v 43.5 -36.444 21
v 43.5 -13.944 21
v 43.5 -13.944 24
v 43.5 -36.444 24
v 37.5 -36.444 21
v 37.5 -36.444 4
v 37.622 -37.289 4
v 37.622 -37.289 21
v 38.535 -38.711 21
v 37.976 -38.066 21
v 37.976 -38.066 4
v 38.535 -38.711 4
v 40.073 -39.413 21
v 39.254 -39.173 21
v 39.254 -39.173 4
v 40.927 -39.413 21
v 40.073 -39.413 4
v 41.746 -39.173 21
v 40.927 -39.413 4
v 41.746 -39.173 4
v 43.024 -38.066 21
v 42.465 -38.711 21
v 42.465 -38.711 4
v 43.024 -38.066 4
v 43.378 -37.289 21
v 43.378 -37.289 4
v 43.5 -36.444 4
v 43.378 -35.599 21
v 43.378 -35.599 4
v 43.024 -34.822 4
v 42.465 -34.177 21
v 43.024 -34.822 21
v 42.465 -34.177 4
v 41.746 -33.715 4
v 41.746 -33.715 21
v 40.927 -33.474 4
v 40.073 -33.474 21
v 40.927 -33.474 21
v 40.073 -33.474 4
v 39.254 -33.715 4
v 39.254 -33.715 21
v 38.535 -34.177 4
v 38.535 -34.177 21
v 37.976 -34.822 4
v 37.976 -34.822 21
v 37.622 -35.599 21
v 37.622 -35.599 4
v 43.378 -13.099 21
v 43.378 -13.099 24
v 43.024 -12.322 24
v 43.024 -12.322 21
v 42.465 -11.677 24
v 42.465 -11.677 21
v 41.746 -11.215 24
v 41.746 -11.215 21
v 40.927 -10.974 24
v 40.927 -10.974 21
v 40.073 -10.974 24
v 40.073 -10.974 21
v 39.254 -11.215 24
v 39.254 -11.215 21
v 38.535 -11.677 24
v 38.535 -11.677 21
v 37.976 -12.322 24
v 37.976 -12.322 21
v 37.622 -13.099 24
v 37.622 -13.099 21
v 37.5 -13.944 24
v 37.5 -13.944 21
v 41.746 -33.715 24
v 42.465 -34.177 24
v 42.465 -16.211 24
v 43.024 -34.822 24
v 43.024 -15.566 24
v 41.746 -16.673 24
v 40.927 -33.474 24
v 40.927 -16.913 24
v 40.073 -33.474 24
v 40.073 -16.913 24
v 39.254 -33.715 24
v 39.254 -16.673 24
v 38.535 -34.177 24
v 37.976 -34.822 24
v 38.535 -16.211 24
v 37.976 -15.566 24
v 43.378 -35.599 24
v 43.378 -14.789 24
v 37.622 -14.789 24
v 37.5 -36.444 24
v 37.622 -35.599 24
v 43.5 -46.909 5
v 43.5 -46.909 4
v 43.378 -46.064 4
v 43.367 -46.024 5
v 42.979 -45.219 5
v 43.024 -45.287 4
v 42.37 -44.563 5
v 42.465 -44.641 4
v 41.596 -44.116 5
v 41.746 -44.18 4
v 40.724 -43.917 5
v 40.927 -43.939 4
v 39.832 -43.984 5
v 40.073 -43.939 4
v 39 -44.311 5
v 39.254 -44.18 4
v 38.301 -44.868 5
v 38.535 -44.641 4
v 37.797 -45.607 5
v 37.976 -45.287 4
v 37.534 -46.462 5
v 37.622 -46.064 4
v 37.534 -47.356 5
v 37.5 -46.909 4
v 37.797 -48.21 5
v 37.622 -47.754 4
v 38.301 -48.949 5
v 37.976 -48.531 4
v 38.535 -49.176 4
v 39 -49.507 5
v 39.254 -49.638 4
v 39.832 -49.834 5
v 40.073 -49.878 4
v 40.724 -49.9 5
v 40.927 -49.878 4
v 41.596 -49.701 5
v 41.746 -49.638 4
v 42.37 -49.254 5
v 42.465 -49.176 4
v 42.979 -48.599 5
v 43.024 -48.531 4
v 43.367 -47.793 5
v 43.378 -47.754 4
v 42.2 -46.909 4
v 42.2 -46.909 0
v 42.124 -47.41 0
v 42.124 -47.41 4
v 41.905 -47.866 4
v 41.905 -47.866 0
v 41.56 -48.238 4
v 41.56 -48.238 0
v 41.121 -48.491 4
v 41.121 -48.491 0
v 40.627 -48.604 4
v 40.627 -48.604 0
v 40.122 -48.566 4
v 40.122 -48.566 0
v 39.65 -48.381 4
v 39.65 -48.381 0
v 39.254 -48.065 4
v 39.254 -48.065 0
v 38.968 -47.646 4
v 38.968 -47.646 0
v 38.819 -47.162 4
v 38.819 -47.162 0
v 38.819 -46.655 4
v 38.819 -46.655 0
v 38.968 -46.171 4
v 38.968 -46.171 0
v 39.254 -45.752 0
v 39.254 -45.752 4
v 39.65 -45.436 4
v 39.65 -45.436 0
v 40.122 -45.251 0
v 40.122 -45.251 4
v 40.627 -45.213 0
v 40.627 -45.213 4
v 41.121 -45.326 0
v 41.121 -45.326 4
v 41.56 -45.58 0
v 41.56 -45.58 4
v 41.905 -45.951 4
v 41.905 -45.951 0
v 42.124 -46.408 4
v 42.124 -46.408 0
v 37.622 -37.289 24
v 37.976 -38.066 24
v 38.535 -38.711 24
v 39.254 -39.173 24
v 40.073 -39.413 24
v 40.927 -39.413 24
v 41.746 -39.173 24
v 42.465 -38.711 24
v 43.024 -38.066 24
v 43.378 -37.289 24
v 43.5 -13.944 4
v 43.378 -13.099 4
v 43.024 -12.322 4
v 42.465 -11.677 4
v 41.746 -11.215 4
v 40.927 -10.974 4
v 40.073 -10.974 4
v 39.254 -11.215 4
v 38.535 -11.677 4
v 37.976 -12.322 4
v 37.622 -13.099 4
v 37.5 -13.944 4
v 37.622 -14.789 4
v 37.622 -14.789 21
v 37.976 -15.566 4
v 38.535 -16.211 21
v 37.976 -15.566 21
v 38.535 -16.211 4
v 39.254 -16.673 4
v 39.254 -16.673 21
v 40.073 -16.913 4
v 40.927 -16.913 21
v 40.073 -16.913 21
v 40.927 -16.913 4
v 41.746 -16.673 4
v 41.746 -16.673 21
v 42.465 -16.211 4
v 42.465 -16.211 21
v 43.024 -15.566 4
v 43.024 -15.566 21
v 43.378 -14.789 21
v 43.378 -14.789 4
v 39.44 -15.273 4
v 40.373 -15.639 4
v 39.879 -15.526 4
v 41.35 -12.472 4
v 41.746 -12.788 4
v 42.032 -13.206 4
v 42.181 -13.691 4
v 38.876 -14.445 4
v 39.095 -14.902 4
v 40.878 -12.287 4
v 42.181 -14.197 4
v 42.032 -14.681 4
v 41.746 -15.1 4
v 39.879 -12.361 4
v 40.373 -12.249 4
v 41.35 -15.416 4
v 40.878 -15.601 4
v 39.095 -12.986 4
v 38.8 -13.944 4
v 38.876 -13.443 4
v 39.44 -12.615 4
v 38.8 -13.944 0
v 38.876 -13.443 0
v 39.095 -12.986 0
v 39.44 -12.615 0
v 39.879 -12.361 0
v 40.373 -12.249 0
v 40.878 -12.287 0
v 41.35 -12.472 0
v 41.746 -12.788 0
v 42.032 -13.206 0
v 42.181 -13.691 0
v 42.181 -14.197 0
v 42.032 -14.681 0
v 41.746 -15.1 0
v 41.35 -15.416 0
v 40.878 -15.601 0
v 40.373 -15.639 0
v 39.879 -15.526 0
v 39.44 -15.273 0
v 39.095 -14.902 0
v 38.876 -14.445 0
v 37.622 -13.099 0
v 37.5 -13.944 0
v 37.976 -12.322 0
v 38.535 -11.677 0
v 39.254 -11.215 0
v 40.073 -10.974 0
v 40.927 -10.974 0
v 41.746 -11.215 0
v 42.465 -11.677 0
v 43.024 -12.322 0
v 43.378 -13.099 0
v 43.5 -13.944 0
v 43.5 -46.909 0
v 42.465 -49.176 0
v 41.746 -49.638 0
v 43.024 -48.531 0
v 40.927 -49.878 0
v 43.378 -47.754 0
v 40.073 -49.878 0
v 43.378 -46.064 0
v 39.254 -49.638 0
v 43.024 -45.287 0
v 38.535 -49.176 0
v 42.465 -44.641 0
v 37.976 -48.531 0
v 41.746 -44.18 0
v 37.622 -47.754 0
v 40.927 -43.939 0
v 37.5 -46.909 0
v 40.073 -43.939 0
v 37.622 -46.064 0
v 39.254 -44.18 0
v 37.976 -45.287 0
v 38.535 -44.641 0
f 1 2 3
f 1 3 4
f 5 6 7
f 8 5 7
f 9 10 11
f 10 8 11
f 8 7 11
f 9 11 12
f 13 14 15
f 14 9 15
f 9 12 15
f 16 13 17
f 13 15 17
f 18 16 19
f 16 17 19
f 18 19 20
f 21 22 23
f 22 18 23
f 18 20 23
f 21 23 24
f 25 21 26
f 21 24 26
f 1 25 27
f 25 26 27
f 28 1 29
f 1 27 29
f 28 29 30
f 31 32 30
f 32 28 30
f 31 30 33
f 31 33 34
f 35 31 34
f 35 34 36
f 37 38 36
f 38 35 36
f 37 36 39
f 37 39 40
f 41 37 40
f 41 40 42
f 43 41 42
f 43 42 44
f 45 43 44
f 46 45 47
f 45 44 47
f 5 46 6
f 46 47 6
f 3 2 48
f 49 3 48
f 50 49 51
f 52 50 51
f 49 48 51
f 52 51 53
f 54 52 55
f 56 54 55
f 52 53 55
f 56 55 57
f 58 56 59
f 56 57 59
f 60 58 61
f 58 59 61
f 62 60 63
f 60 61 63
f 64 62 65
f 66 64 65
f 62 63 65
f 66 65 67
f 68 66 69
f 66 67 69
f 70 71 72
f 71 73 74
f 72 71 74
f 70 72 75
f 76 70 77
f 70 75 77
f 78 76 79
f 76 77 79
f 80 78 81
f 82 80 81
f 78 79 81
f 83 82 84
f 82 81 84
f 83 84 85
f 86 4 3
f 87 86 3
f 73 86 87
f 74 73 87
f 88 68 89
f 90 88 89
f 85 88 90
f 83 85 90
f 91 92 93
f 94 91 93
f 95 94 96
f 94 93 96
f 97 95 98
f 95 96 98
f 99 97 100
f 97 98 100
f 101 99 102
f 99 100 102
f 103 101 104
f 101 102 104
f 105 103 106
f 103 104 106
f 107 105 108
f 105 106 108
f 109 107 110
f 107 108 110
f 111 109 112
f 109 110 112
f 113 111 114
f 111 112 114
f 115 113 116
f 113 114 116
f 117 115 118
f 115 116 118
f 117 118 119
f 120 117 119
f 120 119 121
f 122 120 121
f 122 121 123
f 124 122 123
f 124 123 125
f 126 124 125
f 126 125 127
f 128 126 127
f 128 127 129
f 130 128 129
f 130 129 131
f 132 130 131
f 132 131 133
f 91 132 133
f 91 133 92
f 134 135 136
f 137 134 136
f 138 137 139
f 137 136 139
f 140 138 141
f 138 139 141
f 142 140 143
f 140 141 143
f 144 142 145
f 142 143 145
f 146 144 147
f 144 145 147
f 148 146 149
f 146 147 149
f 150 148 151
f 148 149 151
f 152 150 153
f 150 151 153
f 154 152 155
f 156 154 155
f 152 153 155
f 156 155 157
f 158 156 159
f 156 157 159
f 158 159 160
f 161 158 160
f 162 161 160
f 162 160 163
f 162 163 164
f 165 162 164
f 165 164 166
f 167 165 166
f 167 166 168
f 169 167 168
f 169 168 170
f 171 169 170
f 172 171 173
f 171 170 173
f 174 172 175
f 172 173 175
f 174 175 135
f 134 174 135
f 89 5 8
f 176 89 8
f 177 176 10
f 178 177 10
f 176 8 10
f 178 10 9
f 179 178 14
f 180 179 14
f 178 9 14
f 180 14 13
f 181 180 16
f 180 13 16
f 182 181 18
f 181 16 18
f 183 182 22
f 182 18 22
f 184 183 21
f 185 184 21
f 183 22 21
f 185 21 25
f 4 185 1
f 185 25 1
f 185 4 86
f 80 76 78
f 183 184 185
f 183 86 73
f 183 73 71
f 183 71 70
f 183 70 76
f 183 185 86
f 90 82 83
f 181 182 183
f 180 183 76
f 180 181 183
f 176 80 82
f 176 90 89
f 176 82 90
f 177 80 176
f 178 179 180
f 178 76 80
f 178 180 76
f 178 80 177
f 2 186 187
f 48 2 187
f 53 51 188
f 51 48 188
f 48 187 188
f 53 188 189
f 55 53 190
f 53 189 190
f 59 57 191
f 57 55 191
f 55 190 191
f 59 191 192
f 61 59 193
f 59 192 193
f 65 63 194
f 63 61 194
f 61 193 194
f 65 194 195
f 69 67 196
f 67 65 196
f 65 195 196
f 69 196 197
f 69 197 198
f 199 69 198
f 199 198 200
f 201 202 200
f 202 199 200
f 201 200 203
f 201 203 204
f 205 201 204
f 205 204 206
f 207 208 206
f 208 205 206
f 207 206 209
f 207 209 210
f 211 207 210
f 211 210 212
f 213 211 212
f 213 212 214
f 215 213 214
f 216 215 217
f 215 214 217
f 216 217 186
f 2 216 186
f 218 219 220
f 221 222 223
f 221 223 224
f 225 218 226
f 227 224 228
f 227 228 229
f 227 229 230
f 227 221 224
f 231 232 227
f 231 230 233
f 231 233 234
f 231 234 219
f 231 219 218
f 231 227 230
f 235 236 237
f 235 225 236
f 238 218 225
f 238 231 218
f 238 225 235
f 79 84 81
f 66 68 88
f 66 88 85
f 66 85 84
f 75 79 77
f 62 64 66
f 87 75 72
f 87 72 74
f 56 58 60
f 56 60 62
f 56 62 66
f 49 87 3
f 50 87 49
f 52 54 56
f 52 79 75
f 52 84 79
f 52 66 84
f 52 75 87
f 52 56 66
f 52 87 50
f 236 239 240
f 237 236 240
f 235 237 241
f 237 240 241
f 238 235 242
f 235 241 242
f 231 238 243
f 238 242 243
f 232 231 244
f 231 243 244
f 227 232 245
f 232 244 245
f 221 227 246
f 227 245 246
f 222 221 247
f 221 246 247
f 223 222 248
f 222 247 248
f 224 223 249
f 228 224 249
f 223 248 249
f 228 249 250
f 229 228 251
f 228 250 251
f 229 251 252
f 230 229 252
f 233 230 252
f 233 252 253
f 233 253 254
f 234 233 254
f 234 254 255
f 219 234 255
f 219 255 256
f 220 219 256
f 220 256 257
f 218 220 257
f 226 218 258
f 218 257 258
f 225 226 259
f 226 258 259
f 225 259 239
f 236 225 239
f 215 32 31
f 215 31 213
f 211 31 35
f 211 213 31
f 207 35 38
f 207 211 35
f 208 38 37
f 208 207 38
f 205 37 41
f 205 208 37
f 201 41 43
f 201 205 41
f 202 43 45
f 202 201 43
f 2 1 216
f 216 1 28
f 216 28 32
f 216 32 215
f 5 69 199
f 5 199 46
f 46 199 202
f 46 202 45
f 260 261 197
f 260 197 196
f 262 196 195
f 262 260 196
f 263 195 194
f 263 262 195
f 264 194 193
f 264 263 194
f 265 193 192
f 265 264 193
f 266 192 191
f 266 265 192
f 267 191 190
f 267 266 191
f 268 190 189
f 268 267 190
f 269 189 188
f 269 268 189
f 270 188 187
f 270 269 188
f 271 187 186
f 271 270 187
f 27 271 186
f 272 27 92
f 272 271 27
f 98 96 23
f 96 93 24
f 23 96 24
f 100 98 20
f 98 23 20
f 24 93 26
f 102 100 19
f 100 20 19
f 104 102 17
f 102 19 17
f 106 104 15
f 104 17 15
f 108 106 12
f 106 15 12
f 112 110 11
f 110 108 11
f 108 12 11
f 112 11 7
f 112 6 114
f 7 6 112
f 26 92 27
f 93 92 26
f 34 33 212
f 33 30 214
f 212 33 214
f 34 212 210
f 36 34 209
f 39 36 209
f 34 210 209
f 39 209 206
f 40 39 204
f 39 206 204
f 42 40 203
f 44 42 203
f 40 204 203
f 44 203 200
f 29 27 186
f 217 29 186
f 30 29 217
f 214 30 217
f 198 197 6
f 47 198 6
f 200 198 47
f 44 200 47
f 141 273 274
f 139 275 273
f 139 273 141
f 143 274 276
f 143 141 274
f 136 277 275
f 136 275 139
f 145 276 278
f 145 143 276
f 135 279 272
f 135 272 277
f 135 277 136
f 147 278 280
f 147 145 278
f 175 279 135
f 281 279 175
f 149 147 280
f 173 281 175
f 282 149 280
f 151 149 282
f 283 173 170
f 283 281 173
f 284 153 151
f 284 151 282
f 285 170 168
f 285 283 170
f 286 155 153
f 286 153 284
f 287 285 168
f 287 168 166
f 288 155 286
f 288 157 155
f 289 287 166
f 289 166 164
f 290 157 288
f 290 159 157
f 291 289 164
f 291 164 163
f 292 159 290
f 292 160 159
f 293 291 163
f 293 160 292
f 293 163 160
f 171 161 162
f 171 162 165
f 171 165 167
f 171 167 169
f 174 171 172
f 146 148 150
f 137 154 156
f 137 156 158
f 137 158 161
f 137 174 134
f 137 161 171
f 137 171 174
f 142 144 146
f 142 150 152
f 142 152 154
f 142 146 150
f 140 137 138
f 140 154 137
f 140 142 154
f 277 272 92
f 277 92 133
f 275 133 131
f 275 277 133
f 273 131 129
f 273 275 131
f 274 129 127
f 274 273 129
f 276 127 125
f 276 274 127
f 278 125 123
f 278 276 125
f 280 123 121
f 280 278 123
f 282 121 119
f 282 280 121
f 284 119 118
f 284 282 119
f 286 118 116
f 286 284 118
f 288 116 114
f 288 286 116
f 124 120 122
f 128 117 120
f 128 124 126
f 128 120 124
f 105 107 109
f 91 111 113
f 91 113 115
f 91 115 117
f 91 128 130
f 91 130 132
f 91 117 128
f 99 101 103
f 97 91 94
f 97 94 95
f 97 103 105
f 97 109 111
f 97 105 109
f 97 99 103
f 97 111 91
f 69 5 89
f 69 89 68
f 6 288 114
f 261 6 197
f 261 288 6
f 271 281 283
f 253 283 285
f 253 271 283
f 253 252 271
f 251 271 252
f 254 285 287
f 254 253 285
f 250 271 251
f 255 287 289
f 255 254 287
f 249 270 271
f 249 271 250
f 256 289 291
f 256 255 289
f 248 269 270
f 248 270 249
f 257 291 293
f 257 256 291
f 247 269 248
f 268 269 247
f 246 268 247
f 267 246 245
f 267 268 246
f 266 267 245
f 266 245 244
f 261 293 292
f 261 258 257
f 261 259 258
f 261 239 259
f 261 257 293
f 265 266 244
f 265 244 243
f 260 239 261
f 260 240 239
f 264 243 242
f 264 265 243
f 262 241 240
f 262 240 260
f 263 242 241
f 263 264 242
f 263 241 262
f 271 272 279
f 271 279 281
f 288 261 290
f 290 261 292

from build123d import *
from build123d.topology import SkipClean

# Parameters (mm, degrees)
AUFSATZ_LINEAR_AUSTRAGEN1_DEPTH = 4
SKIZZE2_R                       = 3
AUFSATZ_LINEAR_AUSTRAGEN2_DEPTH = 20
AUFSATZ_LINEAR_START            = -3
AUFSATZ_LINEAR_AUSTRAGEN3_DEPTH = 3
AUFSATZ_LINEAR_START_2          = -4
SKIZZE4_R                       = 3
AUFSATZ_LINEAR_AUSTRAGEN4_DEPTH = 5
SKIZZE5_R                       = 1.7
SCHNITT_LINEAR_AUSTRAGEN1_DEPTH = 4


with BuildPart() as part:
    # Skizze1 → Aufsatz-Linear austragen1 (new body)
    with BuildSketch(Plane.XY):
        with BuildLine():
            Line((43.5, -13.943887949), (43.5, -46.908717461))
            ThreePointArc((43.5, -46.908717461), (40.5, -49.908717461), (37.5, -46.908717461))
            Line((37.5, -46.908717461), (37.5, -13.943887949))
            ThreePointArc((37.5, -13.943887949), (40.5, -10.943887949), (43.5, -13.943887949))
        make_face()
    extrude(amount=AUFSATZ_LINEAR_AUSTRAGEN1_DEPTH)

    # Skizze2 → Aufsatz-Linear austragen2 (add)
    with SkipClean():  # the faces are left unmerged after this step: merging them gives an invalid solid
        with BuildSketch(Plane.XY.offset(4)):
            with Locations((40.5, -13.943887949)):
                Circle(SKIZZE2_R)
            with Locations(Location((40.5, -36.443887949, 0), (0, 0, 180))):
                Circle(SKIZZE2_R)
        extrude(amount=AUFSATZ_LINEAR_AUSTRAGEN2_DEPTH)
    add(part.part.scale(1), mode=Mode.REPLACE)  # the faces are merged on a copy

    # Skizze3 → Aufsatz-Linear austragen3 (add)
    with BuildSketch(Plane.XY.offset(24).offset(AUFSATZ_LINEAR_START)):
        with BuildLine():
            Line((43.5, -13.943887949), (43.5, -36.443887949))
            ThreePointArc((43.5, -36.443887949), (40.5, -39.443887949), (37.5, -36.443887949))
            Line((37.5, -36.443887949), (37.5, -13.943887949))
            ThreePointArc((37.5, -13.943887949), (40.5, -10.943887949), (43.5, -13.943887949))
        make_face()
    extrude(amount=AUFSATZ_LINEAR_AUSTRAGEN3_DEPTH)

    # Skizze4 → Aufsatz-Linear austragen4 (add)
    with BuildSketch(Plane.XY.offset(4).offset(AUFSATZ_LINEAR_START_2)):
        with Locations((40.5, -46.908717461)):
            Circle(SKIZZE4_R)
    extrude(amount=AUFSATZ_LINEAR_AUSTRAGEN4_DEPTH)

    # Skizze5 → Schnitt-Linear austragen1 (cut)
    with BuildSketch(Plane(origin=(0, 0, 0), x_dir=(-1, 0, 0), z_dir=(0, 0, -1))):
        with Locations((-40.5, -13.943887949)):
            Circle(SKIZZE5_R)
        with Locations(Location((-40.5, -46.908717461, 0), (0, 0, 180))):
            Circle(SKIZZE5_R)
    extrude(amount=-SCHNITT_LINEAR_AUSTRAGEN1_DEPTH, mode=Mode.SUBTRACT)


solid = part.part
